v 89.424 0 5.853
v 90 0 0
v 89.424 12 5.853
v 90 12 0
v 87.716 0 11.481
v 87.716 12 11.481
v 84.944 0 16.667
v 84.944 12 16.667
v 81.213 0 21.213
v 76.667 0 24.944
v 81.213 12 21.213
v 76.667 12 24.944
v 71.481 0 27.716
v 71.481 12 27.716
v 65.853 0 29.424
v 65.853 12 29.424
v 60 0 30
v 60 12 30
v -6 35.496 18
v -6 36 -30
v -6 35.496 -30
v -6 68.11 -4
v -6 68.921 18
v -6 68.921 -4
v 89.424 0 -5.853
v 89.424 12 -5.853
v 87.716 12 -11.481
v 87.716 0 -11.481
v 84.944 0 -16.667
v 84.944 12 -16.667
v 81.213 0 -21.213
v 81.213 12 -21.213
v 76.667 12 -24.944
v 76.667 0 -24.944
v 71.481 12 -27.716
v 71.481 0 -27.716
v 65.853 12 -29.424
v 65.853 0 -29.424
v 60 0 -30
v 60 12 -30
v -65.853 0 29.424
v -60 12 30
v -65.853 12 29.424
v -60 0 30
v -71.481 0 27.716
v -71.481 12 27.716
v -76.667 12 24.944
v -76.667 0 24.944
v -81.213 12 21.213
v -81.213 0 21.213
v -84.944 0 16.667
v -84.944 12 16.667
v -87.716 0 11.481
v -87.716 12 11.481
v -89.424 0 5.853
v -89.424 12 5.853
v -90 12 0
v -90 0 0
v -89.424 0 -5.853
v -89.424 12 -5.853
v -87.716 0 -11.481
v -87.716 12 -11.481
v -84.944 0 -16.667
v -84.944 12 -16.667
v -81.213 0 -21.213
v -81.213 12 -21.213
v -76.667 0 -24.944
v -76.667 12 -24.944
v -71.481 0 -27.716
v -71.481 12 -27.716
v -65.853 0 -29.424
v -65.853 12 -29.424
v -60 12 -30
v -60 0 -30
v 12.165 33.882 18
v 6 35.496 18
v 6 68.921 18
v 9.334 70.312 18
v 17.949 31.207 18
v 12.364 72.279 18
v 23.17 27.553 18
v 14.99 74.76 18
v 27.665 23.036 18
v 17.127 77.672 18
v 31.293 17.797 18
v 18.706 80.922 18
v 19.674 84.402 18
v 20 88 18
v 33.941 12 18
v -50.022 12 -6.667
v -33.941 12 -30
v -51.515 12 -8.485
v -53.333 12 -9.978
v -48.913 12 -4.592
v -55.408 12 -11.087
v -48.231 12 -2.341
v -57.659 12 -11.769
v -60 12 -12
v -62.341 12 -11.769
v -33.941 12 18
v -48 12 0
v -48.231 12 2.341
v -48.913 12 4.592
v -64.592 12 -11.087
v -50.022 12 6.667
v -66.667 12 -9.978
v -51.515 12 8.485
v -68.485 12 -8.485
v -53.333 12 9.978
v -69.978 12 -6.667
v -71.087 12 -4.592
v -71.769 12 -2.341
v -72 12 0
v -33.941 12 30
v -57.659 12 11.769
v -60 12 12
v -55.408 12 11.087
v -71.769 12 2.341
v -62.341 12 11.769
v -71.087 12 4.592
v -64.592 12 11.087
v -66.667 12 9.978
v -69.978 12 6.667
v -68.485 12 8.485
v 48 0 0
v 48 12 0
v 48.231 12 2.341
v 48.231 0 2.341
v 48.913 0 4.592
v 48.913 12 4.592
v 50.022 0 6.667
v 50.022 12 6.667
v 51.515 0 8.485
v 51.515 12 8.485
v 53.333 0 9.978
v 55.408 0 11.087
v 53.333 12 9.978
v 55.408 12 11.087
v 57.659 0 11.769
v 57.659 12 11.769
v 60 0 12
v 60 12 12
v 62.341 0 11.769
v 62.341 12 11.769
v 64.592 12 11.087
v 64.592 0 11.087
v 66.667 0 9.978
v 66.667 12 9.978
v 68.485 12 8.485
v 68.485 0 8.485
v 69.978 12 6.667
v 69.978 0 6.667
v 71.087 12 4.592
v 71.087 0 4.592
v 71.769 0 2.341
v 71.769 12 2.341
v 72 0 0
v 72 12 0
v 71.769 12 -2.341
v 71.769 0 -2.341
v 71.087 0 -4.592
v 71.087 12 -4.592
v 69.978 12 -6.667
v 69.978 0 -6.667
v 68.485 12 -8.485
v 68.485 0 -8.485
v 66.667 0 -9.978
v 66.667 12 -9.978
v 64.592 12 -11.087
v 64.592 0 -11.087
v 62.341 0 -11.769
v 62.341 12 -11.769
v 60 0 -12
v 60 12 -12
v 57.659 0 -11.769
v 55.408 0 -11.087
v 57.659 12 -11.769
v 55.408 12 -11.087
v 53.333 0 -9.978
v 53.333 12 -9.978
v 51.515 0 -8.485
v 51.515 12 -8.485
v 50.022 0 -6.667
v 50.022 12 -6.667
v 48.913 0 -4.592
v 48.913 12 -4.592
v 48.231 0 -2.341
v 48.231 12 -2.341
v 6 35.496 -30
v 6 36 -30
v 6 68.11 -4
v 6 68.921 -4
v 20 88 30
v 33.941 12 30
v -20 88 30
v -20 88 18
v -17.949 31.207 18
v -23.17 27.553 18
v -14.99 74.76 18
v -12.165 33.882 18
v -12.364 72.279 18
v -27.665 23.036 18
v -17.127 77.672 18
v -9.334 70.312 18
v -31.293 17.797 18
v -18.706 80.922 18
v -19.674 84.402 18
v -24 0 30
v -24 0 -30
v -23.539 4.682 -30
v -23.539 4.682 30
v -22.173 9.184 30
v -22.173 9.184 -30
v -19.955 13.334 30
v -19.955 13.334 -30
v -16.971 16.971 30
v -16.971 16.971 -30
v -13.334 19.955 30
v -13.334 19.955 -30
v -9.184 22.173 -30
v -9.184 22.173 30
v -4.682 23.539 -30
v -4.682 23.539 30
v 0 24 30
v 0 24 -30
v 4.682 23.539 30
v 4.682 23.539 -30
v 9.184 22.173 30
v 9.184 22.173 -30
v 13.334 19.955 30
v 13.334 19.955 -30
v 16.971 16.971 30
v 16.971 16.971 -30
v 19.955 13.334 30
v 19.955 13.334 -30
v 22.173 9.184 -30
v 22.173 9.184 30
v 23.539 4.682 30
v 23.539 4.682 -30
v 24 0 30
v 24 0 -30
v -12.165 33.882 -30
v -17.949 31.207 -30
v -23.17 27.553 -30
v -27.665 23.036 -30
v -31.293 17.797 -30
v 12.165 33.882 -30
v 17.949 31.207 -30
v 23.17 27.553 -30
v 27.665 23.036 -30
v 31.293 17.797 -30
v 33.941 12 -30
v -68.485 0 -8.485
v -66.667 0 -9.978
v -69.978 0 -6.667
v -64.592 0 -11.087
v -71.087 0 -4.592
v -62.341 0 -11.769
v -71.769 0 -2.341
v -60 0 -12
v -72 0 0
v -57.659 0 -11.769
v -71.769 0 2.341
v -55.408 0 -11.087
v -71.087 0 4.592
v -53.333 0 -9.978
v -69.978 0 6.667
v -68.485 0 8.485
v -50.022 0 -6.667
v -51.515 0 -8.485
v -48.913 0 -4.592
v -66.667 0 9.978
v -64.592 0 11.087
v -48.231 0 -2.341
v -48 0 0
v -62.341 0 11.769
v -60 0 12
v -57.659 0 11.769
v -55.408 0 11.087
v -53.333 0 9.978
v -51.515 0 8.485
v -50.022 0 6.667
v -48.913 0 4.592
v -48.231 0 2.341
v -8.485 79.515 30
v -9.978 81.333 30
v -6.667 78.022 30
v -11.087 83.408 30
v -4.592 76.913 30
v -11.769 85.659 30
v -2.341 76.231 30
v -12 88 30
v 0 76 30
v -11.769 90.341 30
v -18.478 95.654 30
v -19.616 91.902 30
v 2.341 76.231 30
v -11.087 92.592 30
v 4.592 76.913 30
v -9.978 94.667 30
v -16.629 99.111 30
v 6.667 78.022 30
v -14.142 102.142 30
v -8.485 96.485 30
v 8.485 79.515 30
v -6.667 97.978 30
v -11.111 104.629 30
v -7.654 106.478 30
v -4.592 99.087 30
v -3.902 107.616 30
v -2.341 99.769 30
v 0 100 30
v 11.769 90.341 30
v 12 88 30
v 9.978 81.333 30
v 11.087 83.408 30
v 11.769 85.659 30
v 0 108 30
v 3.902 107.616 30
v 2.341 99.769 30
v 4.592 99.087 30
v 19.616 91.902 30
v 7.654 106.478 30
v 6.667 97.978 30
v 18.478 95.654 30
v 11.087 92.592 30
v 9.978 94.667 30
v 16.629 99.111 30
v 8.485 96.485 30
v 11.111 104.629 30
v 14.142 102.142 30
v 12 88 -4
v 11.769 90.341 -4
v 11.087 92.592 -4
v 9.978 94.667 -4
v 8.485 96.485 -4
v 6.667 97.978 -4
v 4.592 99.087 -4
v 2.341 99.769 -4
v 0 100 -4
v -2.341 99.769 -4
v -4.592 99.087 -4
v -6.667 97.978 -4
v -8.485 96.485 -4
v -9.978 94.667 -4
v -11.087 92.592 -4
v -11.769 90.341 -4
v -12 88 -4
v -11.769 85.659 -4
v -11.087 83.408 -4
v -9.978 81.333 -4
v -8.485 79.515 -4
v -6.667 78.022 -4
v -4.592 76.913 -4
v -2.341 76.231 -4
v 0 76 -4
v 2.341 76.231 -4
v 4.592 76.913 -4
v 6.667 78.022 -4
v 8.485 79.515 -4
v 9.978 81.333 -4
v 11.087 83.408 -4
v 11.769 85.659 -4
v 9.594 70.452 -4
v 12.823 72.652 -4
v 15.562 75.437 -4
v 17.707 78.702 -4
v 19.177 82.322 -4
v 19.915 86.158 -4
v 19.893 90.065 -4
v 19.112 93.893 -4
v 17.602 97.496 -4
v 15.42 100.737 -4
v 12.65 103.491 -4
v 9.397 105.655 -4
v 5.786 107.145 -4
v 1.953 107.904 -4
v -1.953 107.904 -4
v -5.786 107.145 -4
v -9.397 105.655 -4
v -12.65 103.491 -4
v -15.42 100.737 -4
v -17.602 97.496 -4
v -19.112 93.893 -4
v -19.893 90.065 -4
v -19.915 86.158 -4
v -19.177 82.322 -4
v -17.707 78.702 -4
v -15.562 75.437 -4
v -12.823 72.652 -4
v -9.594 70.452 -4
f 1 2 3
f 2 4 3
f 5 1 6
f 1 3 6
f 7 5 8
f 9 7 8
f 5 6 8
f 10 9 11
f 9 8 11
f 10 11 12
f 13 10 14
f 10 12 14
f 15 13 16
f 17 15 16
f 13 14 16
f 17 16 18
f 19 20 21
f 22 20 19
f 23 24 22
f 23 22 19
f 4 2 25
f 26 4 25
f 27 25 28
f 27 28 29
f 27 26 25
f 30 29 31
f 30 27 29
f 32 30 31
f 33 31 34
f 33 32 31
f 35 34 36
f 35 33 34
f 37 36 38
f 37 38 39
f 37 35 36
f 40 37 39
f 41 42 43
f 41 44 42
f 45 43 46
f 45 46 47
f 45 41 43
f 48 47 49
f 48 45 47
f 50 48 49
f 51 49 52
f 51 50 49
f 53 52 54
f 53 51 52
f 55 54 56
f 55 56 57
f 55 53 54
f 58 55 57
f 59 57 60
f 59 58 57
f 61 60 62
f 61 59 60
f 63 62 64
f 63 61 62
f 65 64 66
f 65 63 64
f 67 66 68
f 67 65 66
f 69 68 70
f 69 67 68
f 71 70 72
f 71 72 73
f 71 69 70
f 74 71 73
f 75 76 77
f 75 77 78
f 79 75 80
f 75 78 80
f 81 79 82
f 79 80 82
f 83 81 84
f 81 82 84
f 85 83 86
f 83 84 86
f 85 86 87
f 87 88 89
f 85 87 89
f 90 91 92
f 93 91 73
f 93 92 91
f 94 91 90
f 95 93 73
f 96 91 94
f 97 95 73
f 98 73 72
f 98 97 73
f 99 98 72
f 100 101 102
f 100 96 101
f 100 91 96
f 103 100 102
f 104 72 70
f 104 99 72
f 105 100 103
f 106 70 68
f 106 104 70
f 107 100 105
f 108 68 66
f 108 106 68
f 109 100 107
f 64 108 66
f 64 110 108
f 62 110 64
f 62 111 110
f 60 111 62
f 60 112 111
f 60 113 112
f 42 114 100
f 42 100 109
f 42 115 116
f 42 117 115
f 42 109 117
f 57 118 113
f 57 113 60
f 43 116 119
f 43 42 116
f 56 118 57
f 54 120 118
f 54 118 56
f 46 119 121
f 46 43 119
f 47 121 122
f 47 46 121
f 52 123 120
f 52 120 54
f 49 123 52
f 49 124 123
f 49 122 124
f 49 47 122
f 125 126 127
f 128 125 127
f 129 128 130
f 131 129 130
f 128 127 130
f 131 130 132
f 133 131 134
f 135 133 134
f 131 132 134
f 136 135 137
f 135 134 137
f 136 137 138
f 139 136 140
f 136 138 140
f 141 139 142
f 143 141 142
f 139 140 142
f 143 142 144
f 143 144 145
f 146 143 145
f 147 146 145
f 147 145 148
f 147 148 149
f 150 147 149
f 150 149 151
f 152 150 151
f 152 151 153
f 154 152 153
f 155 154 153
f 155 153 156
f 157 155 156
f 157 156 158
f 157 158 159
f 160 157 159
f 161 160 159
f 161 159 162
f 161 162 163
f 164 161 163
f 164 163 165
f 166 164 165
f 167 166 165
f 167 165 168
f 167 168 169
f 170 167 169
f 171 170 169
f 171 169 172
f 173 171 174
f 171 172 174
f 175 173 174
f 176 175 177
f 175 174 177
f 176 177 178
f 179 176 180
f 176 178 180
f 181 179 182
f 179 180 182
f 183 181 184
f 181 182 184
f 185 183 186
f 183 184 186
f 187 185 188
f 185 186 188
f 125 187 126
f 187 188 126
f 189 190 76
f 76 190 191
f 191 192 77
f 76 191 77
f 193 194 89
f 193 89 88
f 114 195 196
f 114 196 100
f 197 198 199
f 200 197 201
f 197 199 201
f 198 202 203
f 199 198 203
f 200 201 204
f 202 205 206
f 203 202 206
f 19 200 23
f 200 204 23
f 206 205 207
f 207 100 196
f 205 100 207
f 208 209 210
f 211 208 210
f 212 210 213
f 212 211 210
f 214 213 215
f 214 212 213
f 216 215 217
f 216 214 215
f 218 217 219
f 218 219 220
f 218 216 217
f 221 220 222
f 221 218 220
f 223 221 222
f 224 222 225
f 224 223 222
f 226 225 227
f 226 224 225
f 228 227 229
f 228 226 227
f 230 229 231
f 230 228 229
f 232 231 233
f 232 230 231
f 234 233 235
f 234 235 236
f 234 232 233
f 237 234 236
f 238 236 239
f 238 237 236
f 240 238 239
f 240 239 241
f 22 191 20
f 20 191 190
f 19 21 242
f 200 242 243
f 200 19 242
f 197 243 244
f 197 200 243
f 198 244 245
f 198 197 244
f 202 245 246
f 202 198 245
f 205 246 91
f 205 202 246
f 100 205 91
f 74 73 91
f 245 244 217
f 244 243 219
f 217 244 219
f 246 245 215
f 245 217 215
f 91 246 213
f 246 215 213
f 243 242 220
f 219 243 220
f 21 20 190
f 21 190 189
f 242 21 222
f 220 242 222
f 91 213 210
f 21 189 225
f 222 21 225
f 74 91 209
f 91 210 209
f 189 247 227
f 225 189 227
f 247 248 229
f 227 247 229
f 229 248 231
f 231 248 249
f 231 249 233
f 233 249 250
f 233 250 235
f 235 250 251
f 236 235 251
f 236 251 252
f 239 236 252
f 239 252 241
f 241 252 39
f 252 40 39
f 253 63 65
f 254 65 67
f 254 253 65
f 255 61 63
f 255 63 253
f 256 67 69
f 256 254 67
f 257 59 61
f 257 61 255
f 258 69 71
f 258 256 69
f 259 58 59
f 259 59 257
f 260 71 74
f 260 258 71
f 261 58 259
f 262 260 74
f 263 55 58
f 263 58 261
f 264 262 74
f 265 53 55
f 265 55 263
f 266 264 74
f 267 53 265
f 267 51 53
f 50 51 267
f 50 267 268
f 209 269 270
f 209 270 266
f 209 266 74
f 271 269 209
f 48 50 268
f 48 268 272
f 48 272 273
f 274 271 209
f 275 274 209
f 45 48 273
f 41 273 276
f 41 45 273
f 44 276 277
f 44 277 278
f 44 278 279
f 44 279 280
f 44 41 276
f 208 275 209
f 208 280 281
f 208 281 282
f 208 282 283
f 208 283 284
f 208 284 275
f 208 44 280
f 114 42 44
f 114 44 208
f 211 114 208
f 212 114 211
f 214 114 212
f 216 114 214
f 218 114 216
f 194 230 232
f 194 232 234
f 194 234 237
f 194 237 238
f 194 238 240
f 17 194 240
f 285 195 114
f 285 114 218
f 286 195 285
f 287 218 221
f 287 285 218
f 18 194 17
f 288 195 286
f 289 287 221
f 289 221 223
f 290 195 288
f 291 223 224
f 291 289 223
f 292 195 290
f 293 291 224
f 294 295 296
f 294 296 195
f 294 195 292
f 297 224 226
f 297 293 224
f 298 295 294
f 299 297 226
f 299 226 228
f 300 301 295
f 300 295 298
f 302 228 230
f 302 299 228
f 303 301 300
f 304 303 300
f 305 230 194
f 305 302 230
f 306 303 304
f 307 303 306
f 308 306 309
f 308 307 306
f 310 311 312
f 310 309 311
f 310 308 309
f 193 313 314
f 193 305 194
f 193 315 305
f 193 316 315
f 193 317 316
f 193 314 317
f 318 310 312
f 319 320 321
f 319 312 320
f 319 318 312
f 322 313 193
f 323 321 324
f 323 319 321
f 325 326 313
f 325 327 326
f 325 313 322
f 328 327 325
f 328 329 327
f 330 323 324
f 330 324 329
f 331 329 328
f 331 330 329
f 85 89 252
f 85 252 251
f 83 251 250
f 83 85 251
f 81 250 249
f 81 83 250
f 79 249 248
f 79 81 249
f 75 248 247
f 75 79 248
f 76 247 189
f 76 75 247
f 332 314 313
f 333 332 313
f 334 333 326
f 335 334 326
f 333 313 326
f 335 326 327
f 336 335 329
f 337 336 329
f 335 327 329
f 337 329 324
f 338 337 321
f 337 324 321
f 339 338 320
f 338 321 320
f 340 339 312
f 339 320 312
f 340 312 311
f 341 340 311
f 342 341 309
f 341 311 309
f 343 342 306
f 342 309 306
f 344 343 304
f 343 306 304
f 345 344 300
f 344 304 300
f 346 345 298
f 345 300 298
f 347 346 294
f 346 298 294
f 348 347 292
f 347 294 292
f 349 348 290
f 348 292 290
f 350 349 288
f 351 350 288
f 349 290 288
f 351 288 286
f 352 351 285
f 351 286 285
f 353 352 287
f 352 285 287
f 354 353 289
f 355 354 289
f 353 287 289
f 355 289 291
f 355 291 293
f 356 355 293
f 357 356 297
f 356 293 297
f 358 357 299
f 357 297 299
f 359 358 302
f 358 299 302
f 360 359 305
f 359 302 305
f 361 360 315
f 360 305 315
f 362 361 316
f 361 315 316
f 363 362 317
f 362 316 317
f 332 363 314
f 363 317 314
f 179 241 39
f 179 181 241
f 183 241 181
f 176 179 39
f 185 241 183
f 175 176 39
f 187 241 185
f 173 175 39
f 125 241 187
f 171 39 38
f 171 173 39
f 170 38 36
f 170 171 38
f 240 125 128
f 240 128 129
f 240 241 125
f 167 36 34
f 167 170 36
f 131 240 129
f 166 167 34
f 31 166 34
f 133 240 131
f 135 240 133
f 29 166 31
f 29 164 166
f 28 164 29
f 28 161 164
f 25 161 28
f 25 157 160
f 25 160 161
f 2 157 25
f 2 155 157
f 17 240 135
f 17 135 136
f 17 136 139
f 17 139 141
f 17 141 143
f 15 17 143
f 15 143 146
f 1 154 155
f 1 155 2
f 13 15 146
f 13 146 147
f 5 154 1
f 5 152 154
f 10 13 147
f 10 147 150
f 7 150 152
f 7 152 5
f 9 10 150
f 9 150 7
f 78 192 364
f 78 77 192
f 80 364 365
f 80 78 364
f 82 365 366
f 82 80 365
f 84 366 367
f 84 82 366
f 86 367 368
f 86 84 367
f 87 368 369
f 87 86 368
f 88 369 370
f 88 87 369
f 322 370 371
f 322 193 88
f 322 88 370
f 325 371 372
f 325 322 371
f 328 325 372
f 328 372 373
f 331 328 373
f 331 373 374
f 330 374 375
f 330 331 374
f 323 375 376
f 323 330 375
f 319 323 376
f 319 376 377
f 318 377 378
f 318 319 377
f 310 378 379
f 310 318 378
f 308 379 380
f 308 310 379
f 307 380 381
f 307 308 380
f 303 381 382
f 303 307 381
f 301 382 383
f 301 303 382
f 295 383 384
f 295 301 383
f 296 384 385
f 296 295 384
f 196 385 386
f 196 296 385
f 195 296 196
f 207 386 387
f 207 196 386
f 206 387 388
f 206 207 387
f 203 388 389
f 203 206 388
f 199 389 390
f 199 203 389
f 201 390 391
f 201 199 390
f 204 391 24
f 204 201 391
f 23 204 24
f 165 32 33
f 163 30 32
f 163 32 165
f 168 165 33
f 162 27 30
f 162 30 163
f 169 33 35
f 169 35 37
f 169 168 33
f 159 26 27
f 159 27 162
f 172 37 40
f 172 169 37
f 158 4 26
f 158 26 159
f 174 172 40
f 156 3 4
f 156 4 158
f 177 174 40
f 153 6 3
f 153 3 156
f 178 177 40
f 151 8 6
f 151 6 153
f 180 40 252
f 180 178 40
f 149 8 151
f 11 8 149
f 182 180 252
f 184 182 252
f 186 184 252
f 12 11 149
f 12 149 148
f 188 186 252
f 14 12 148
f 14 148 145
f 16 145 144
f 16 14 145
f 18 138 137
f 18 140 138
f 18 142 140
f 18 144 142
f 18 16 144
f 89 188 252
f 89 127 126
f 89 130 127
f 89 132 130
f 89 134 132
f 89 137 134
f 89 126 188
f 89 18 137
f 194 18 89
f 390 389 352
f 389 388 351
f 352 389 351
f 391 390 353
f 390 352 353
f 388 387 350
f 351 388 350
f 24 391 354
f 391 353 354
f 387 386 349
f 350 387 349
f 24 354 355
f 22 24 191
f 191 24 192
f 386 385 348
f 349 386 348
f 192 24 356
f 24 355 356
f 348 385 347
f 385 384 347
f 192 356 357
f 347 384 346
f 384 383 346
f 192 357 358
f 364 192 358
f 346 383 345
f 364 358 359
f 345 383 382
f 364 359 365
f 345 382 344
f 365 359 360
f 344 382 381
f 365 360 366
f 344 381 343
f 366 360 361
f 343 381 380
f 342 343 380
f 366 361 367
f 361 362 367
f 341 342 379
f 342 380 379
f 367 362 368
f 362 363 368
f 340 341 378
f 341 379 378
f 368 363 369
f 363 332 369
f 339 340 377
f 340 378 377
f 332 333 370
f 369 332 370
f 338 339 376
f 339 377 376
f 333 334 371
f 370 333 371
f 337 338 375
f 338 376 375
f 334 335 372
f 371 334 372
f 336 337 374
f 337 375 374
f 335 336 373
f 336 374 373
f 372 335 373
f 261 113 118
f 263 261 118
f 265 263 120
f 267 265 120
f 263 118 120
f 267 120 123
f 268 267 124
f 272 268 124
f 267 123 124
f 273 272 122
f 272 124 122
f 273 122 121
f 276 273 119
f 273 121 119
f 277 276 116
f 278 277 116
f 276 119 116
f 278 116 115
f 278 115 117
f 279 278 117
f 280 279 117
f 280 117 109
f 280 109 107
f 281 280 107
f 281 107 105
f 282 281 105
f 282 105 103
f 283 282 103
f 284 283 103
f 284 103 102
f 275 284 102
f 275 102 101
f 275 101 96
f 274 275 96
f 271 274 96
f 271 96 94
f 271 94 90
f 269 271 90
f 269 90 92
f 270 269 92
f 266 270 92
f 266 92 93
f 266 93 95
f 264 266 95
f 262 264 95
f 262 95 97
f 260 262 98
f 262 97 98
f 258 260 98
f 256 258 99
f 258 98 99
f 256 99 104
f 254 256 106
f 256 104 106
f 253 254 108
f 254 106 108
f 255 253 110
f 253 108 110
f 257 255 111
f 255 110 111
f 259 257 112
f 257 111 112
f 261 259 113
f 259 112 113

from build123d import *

# Parameters (mm, degrees)
BOSS_EXTRUDE1_DEPTH = 30
FILLET1_R           = 30
FILLET2_R           = 30
SKETCH5_R           = 12
CUT_EXTRUDE1_DEPTH  = 98.857038582
FILLET3_RADIUS      = 30
FILLET3_LENGTH      = 12
SKETCH6_R           = 12
CUT_EXTRUDE2_DEPTH  = 98.857038582
SKETCH2_R           = 20
SKETCH2_R_2         = 12
BOSS_EXTRUDE2_DEPTH = 34
BOSS_EXTRUDE3_DEPTH = 12
BOSS_EXTRUDE4_DEPTH = 6


with BuildPart() as part:
    # Sketch1 → Boss-Extrude1 (new, symmetric)
    with BuildSketch(Plane.XY):
        with BuildLine():
            Line((-90, 0), (-24, 0))
            ThreePointArc((-24, 0), (0, 24), (24, 0))
            Line((24, 0), (90, 0))
            Line((90, 0), (90, 12))
            Line((90, 12), (33.941125497, 12))
            ThreePointArc((33.941125497, 12), (0, 36), (-33.941125497, 12))
            Line((-33.941125497, 12), (-90, 12))
            Line((-90, 12), (-90, 0))
        make_face()
    extrude(amount=BOSS_EXTRUDE1_DEPTH, both=True)

    # Fillet1
    fillet1_edges = [part.edges().sort_by_distance(p)[0] for p in [
        (90, 6, -30),
    ]]
    fillet(fillet1_edges, radius=FILLET1_R)

    # Fillet2
    fillet2_edges = [part.edges().sort_by_distance(p)[0] for p in [
        (90, 6, 30),
    ]]
    fillet(fillet2_edges, radius=FILLET2_R - 0.0001)  # a hair under: the kernel refuses the full size

    # Sketch5 → Cut-Extrude1 (cut, through all)
    with BuildSketch(Plane(origin=(0, 12, 0), x_dir=(1, 0, 0), z_dir=(0, 1, 0))):
        with Locations(Location((60, 0, 0), (0, 0, 180))):
            Circle(SKETCH5_R)
    extrude(amount=-CUT_EXTRUDE1_DEPTH, mode=Mode.SUBTRACT)

    # Fillet3: full round fillet: the end face becomes a half cylinder, R = half its width
    fillet3_face = Plane((-90, 6, 0), x_dir=(0, -1, 0), z_dir=(-1, 0, 0))  # on the end face: x along it, z out of the body
    fillet3_slab = fillet3_face.offset(-FILLET3_RADIUS / 2) * Box(FILLET3_LENGTH, 2 * FILLET3_RADIUS, FILLET3_RADIUS, mode=Mode.PRIVATE)  # the body's end, R deep
    fillet3_round = Plane((-60, 6, 0), x_dir=(-1, 0, 0), z_dir=(0, -1, 0)) * Cylinder(FILLET3_RADIUS, FILLET3_LENGTH, mode=Mode.PRIVATE)  # its axis R under the face
    add(fillet3_slab - fillet3_round, mode=Mode.SUBTRACT)

    # Sketch6 → Cut-Extrude2 (cut, through all)
    with BuildSketch(Plane(origin=(0, 12, 0), x_dir=(1, 0, 0), z_dir=(0, 1, 0))):
        with Locations(Location((-60, 0, 0), (0, 0, 180))):
            Circle(SKETCH6_R)
    extrude(amount=-CUT_EXTRUDE2_DEPTH, mode=Mode.SUBTRACT)



with BuildPart() as body_2:
    # Sketch2 → Boss-Extrude2 (new body)
    with BuildSketch(Plane.XY.offset(30)):
        with Locations((0, 88)):
            Circle(SKETCH2_R)
        with Locations((0, 88)):
            Circle(SKETCH2_R_2, mode=Mode.SUBTRACT)
    extrude(amount=-BOSS_EXTRUDE2_DEPTH)


with BuildPart() as part_1:
    add(part.part)

    add(body_2.part)  # Boss-Extrude3 merges body 2
    # Sketch3 → Boss-Extrude3 (add)
    with BuildSketch(Plane.XY.offset(30)):
        with BuildLine():
            Line((33.941125497, 12), (20, 88))
            ThreePointArc((20, 88), (0, 68), (-20, 88))
            Line((-20, 88), (-33.941125497, 12))
            ThreePointArc((-33.941125497, 12), (0, 36), (33.941125497, 12))
        make_face()
    extrude(amount=-BOSS_EXTRUDE3_DEPTH)

    # Sketch4 → Boss-Extrude4 (add, symmetric)
    with BuildSketch(Plane(origin=(0, 0, 0), x_dir=(0, 0, -1), z_dir=(1, 0, 0))):
        Polygon((-16.617348449, 30.307571786), (-22.191110534, 30.307571786), (-22.191110534, 71.304305049), (4, 71.304305049), (4, 68.110118748), (30, 36), (30, 30.307571786), align=None)
    extrude(amount=BOSS_EXTRUDE4_DEPTH, both=True)


solid = part_1.part
